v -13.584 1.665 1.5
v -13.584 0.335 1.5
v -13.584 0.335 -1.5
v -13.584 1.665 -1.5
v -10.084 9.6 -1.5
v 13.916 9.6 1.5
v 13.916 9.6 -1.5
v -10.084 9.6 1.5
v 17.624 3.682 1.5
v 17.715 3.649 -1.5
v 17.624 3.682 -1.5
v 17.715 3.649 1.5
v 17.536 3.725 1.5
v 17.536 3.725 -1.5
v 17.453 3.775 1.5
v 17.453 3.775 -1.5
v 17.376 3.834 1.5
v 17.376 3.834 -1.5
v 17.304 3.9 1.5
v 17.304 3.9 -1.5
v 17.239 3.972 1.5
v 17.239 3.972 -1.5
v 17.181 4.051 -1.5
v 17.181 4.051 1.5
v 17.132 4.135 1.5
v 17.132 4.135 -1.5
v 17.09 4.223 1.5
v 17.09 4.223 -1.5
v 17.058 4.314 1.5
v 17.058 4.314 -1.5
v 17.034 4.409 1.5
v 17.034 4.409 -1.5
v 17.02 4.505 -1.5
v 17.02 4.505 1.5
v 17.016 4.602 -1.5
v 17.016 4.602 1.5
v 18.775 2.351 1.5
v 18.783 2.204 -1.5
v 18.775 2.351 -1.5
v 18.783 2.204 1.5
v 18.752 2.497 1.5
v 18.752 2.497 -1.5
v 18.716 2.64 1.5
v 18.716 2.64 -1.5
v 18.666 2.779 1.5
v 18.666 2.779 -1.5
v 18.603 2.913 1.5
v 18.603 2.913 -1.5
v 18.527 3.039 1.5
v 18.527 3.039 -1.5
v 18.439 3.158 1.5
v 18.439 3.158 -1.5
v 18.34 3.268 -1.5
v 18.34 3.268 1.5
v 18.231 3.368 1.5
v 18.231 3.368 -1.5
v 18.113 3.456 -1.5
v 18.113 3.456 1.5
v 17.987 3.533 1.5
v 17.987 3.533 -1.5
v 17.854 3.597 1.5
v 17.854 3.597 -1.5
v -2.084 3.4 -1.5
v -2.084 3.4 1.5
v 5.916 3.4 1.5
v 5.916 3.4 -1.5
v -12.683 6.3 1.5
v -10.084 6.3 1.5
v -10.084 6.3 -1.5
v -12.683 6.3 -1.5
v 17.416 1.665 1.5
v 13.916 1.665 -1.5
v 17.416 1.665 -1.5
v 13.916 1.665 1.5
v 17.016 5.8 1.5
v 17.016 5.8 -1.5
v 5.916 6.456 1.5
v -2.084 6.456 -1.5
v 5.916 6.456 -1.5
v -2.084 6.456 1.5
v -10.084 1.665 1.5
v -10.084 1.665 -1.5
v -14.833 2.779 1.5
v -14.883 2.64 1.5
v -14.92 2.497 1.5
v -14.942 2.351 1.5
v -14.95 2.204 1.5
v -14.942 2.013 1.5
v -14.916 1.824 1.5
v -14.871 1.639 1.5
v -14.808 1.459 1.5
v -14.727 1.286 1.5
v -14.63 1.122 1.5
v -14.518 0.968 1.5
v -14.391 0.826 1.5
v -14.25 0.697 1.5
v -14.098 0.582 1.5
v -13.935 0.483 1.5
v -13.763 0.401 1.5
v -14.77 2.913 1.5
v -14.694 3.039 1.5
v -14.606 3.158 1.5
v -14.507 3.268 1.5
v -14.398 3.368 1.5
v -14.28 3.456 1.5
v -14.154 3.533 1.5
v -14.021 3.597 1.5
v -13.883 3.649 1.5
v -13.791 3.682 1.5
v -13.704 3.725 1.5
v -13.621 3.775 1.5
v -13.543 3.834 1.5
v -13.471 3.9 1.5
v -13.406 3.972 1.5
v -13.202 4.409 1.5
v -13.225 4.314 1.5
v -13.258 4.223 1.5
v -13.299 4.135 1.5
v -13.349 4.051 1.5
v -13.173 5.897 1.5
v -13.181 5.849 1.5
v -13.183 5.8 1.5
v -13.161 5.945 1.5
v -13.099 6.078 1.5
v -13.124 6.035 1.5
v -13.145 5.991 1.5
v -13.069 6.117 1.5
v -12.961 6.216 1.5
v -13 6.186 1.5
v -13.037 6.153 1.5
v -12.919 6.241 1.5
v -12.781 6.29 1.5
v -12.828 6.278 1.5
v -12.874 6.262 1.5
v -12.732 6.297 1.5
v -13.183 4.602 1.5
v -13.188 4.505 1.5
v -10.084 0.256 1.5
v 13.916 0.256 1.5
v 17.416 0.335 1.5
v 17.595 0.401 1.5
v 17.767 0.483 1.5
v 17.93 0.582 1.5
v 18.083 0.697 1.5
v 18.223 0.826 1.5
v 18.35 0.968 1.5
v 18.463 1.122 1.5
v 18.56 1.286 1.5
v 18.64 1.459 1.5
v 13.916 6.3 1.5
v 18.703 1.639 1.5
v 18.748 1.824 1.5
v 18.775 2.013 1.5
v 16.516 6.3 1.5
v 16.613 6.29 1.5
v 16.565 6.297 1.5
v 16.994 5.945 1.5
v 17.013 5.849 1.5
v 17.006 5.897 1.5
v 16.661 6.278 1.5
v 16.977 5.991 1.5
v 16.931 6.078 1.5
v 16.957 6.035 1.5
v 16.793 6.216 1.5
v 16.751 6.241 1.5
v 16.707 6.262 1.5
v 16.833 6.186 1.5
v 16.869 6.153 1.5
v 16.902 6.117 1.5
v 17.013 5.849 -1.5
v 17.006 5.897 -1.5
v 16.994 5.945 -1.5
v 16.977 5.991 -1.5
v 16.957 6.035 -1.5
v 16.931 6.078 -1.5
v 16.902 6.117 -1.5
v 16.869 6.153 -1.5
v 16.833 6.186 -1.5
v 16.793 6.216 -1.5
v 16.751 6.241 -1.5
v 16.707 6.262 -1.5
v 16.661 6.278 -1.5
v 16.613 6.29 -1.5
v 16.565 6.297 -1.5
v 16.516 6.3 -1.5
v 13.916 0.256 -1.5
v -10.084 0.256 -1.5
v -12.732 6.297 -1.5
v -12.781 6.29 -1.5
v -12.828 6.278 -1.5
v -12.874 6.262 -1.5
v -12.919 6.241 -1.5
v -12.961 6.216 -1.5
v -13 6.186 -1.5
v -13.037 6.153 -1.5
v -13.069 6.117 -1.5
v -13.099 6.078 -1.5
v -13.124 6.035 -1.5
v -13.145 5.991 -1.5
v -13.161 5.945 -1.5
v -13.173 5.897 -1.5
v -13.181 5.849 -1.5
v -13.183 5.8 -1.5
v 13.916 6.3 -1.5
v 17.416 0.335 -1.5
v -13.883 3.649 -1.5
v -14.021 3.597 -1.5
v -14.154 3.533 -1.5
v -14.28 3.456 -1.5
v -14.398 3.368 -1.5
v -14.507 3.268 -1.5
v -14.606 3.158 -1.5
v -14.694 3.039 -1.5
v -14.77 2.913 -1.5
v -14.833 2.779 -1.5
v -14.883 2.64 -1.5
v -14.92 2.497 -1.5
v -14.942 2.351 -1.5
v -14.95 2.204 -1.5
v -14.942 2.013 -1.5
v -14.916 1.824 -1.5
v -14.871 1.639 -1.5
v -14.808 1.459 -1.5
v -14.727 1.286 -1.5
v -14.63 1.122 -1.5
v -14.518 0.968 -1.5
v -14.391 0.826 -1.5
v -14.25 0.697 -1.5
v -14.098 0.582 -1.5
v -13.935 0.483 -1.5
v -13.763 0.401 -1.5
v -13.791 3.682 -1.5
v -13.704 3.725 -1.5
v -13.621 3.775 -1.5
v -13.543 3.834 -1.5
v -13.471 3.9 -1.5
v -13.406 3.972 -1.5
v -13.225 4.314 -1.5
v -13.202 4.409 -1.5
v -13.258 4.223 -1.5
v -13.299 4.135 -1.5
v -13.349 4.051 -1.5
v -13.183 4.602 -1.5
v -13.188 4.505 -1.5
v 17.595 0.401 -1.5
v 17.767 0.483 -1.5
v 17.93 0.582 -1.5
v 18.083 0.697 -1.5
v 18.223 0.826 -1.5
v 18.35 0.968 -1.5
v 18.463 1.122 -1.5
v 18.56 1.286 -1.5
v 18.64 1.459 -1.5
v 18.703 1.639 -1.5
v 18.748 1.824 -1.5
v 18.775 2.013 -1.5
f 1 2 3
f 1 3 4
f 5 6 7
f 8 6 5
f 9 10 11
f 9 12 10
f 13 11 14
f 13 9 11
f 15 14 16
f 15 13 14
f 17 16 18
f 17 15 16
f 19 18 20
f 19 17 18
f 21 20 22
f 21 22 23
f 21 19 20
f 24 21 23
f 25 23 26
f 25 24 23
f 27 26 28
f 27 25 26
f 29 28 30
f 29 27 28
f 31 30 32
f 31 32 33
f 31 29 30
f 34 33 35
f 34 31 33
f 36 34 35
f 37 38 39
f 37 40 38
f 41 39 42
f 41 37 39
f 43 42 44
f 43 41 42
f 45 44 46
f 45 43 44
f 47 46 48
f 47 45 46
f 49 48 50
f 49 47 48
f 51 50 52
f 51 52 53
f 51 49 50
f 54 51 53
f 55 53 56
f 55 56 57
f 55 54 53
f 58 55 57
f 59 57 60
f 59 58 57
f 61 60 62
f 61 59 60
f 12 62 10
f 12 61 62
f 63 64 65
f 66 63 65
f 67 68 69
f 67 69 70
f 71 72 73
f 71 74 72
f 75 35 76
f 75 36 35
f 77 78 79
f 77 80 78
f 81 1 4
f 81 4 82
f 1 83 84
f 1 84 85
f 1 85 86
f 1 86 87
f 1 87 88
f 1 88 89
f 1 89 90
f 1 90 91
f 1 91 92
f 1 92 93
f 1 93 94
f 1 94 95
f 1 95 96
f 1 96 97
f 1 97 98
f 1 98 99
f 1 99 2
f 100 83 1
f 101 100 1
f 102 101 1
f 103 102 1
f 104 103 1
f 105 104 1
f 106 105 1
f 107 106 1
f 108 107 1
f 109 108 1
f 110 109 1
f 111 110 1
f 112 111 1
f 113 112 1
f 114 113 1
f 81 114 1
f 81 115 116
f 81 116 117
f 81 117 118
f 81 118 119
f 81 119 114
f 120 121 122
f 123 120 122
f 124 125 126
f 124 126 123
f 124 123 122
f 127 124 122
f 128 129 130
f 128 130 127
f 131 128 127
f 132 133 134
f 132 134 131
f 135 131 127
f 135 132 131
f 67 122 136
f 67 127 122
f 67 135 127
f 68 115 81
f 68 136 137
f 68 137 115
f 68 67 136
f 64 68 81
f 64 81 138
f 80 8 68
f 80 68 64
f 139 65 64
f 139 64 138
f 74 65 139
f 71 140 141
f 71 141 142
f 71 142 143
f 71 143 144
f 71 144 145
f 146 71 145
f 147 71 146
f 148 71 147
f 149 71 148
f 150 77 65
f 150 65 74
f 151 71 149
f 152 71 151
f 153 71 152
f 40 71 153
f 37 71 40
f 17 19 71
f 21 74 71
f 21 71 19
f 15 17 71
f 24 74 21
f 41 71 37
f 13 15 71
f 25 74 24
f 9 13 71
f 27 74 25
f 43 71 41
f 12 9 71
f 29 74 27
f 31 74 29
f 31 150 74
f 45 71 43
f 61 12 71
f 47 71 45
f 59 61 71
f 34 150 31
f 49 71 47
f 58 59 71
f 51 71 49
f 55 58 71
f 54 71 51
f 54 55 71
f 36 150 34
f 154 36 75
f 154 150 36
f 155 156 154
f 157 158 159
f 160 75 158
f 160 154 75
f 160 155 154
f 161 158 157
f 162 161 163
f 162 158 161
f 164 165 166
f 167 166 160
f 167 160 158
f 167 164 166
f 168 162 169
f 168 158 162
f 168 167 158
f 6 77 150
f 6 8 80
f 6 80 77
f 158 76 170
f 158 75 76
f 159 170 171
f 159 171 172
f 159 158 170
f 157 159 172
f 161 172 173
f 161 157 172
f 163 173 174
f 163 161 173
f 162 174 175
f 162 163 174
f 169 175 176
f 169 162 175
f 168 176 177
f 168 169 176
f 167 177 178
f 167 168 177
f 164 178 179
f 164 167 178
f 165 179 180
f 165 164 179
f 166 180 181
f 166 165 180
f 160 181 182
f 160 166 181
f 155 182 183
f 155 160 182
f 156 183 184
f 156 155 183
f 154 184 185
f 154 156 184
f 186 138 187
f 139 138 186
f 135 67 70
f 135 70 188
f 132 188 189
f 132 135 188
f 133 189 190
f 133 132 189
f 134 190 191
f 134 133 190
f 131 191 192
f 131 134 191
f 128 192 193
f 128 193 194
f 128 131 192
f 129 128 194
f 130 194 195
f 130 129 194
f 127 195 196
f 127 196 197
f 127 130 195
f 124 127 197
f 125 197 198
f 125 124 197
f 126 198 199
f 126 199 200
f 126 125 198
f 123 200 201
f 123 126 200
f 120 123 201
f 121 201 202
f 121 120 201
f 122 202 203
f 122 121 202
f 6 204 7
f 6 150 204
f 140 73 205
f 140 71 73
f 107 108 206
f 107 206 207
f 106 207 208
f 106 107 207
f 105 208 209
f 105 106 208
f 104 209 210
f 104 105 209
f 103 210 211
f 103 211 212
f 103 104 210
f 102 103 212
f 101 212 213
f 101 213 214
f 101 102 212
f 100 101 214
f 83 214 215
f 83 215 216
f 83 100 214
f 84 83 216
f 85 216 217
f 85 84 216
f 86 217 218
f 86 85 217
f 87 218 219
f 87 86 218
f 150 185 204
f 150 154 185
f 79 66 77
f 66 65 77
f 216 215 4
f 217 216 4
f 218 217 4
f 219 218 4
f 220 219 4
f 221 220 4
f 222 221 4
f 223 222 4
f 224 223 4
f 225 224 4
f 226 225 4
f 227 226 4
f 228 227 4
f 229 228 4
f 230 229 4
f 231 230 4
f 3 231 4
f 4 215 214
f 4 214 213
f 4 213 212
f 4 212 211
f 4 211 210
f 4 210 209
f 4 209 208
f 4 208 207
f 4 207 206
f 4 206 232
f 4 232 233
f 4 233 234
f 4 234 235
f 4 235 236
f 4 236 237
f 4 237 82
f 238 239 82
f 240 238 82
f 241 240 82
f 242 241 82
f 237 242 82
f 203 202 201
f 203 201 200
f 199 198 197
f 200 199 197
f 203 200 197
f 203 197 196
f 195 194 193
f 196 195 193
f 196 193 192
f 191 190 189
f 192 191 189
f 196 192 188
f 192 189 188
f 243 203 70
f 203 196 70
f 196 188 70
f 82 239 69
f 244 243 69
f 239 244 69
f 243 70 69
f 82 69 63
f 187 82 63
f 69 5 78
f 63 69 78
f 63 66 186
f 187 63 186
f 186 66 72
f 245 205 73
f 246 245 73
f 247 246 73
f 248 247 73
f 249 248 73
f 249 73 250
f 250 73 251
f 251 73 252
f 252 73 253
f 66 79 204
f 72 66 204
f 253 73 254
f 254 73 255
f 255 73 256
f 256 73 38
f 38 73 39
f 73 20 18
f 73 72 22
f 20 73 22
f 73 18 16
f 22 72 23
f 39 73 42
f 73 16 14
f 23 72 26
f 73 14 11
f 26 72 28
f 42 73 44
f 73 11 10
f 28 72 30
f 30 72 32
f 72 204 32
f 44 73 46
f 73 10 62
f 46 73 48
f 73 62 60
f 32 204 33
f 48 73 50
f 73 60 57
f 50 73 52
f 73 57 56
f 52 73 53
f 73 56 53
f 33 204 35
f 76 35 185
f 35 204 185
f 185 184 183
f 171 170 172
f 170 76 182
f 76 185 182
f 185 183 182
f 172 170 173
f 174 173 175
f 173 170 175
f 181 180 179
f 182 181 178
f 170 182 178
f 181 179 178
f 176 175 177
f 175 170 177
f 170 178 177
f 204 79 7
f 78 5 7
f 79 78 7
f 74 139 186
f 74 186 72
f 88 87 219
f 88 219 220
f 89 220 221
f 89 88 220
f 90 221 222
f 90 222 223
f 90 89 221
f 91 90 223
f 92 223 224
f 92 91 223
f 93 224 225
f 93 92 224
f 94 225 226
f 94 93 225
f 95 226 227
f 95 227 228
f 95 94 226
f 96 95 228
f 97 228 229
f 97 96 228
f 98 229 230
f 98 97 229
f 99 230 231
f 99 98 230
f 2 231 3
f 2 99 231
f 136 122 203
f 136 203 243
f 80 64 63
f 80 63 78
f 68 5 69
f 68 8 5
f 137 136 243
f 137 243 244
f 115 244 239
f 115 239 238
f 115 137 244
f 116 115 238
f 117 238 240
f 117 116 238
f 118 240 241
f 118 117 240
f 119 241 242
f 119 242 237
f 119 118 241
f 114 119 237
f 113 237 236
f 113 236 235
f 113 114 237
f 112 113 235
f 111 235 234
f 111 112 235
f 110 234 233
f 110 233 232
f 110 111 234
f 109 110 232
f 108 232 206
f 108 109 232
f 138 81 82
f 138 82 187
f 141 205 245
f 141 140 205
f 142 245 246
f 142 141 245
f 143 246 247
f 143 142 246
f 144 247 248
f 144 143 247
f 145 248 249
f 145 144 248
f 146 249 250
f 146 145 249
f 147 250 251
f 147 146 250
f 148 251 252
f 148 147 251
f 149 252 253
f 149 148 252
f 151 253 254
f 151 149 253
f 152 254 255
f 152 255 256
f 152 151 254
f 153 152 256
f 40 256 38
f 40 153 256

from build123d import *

# Parameters (mm, degrees)
SKETCH1_W           = 8
SKETCH1_H           = 3.056305014
BOSS_EXTRUDE1_DEPTH = 1.5


with BuildPart() as part:
    # Sketch1 → Boss-Extrude1 (new, symmetric)
    with BuildSketch(Plane.XY):
        with BuildLine():
            Line((-10.083709216, 9.599779274), (-10.083709216, 6.299779274))
            Line((-10.083709216, 6.299779274), (-12.68296021, 6.299779274))
            ThreePointArc((-12.68296021, 6.299779274), (-13.0365136, 6.153332664), (-13.18296021, 5.799779274))
            Line((-13.18296021, 5.799779274), (-13.18296021, 4.602368782))
            ThreePointArc((-13.18296021, 4.602368782), (-13.376633784, 4.010897992), (-13.882635601, 3.648531727))
            ThreePointArc((-13.882635601, 3.648531727), (-14.651645992, 3.099880506), (-14.950395595, 2.20369759))
            ThreePointArc((-14.950395595, 2.20369759), (-14.575936583, 1.043545253), (-13.583709216, 0.335267166))
            Line((-13.583709216, 0.335267166), (-13.583709216, 1.664695612))
            Line((-13.583709216, 1.664695612), (-10.083709216, 1.664695612))
            Line((-10.083709216, 1.664695612), (-10.083709216, 0.256084288))
            Line((-10.083709216, 0.256084288), (13.916290784, 0.256084288))
            Line((13.916290784, 0.256084288), (13.916290784, 1.664695612))
            Line((13.916290784, 1.664695612), (17.416290784, 1.664695612))
            Line((17.416290784, 1.664695612), (17.416290784, 0.335267166))
            ThreePointArc((17.416290784, 0.335267166), (18.408518152, 1.043545253), (18.782977164, 2.20369759))
            ThreePointArc((18.782977164, 2.20369759), (18.484227561, 3.099880506), (17.715217169, 3.648531727))
            ThreePointArc((17.715217169, 3.648531727), (17.209215353, 4.010897992), (17.015541778, 4.602368782))
            Line((17.015541778, 4.602368782), (17.015541778, 5.799779274))
            ThreePointArc((17.015541778, 5.799779274), (16.869095169, 6.153332664), (16.515541778, 6.299779274))
            Line((16.515541778, 6.299779274), (13.916290784, 6.299779274))
            Line((13.916290784, 6.299779274), (13.916290784, 9.599779274))
            Line((13.916290784, 9.599779274), (-10.083709216, 9.599779274))
        make_face()
        with Locations((1.916290784, 4.927931781)):
            Rectangle(SKETCH1_W, SKETCH1_H, mode=Mode.SUBTRACT)
    extrude(amount=BOSS_EXTRUDE1_DEPTH, both=True)


solid = part.part
